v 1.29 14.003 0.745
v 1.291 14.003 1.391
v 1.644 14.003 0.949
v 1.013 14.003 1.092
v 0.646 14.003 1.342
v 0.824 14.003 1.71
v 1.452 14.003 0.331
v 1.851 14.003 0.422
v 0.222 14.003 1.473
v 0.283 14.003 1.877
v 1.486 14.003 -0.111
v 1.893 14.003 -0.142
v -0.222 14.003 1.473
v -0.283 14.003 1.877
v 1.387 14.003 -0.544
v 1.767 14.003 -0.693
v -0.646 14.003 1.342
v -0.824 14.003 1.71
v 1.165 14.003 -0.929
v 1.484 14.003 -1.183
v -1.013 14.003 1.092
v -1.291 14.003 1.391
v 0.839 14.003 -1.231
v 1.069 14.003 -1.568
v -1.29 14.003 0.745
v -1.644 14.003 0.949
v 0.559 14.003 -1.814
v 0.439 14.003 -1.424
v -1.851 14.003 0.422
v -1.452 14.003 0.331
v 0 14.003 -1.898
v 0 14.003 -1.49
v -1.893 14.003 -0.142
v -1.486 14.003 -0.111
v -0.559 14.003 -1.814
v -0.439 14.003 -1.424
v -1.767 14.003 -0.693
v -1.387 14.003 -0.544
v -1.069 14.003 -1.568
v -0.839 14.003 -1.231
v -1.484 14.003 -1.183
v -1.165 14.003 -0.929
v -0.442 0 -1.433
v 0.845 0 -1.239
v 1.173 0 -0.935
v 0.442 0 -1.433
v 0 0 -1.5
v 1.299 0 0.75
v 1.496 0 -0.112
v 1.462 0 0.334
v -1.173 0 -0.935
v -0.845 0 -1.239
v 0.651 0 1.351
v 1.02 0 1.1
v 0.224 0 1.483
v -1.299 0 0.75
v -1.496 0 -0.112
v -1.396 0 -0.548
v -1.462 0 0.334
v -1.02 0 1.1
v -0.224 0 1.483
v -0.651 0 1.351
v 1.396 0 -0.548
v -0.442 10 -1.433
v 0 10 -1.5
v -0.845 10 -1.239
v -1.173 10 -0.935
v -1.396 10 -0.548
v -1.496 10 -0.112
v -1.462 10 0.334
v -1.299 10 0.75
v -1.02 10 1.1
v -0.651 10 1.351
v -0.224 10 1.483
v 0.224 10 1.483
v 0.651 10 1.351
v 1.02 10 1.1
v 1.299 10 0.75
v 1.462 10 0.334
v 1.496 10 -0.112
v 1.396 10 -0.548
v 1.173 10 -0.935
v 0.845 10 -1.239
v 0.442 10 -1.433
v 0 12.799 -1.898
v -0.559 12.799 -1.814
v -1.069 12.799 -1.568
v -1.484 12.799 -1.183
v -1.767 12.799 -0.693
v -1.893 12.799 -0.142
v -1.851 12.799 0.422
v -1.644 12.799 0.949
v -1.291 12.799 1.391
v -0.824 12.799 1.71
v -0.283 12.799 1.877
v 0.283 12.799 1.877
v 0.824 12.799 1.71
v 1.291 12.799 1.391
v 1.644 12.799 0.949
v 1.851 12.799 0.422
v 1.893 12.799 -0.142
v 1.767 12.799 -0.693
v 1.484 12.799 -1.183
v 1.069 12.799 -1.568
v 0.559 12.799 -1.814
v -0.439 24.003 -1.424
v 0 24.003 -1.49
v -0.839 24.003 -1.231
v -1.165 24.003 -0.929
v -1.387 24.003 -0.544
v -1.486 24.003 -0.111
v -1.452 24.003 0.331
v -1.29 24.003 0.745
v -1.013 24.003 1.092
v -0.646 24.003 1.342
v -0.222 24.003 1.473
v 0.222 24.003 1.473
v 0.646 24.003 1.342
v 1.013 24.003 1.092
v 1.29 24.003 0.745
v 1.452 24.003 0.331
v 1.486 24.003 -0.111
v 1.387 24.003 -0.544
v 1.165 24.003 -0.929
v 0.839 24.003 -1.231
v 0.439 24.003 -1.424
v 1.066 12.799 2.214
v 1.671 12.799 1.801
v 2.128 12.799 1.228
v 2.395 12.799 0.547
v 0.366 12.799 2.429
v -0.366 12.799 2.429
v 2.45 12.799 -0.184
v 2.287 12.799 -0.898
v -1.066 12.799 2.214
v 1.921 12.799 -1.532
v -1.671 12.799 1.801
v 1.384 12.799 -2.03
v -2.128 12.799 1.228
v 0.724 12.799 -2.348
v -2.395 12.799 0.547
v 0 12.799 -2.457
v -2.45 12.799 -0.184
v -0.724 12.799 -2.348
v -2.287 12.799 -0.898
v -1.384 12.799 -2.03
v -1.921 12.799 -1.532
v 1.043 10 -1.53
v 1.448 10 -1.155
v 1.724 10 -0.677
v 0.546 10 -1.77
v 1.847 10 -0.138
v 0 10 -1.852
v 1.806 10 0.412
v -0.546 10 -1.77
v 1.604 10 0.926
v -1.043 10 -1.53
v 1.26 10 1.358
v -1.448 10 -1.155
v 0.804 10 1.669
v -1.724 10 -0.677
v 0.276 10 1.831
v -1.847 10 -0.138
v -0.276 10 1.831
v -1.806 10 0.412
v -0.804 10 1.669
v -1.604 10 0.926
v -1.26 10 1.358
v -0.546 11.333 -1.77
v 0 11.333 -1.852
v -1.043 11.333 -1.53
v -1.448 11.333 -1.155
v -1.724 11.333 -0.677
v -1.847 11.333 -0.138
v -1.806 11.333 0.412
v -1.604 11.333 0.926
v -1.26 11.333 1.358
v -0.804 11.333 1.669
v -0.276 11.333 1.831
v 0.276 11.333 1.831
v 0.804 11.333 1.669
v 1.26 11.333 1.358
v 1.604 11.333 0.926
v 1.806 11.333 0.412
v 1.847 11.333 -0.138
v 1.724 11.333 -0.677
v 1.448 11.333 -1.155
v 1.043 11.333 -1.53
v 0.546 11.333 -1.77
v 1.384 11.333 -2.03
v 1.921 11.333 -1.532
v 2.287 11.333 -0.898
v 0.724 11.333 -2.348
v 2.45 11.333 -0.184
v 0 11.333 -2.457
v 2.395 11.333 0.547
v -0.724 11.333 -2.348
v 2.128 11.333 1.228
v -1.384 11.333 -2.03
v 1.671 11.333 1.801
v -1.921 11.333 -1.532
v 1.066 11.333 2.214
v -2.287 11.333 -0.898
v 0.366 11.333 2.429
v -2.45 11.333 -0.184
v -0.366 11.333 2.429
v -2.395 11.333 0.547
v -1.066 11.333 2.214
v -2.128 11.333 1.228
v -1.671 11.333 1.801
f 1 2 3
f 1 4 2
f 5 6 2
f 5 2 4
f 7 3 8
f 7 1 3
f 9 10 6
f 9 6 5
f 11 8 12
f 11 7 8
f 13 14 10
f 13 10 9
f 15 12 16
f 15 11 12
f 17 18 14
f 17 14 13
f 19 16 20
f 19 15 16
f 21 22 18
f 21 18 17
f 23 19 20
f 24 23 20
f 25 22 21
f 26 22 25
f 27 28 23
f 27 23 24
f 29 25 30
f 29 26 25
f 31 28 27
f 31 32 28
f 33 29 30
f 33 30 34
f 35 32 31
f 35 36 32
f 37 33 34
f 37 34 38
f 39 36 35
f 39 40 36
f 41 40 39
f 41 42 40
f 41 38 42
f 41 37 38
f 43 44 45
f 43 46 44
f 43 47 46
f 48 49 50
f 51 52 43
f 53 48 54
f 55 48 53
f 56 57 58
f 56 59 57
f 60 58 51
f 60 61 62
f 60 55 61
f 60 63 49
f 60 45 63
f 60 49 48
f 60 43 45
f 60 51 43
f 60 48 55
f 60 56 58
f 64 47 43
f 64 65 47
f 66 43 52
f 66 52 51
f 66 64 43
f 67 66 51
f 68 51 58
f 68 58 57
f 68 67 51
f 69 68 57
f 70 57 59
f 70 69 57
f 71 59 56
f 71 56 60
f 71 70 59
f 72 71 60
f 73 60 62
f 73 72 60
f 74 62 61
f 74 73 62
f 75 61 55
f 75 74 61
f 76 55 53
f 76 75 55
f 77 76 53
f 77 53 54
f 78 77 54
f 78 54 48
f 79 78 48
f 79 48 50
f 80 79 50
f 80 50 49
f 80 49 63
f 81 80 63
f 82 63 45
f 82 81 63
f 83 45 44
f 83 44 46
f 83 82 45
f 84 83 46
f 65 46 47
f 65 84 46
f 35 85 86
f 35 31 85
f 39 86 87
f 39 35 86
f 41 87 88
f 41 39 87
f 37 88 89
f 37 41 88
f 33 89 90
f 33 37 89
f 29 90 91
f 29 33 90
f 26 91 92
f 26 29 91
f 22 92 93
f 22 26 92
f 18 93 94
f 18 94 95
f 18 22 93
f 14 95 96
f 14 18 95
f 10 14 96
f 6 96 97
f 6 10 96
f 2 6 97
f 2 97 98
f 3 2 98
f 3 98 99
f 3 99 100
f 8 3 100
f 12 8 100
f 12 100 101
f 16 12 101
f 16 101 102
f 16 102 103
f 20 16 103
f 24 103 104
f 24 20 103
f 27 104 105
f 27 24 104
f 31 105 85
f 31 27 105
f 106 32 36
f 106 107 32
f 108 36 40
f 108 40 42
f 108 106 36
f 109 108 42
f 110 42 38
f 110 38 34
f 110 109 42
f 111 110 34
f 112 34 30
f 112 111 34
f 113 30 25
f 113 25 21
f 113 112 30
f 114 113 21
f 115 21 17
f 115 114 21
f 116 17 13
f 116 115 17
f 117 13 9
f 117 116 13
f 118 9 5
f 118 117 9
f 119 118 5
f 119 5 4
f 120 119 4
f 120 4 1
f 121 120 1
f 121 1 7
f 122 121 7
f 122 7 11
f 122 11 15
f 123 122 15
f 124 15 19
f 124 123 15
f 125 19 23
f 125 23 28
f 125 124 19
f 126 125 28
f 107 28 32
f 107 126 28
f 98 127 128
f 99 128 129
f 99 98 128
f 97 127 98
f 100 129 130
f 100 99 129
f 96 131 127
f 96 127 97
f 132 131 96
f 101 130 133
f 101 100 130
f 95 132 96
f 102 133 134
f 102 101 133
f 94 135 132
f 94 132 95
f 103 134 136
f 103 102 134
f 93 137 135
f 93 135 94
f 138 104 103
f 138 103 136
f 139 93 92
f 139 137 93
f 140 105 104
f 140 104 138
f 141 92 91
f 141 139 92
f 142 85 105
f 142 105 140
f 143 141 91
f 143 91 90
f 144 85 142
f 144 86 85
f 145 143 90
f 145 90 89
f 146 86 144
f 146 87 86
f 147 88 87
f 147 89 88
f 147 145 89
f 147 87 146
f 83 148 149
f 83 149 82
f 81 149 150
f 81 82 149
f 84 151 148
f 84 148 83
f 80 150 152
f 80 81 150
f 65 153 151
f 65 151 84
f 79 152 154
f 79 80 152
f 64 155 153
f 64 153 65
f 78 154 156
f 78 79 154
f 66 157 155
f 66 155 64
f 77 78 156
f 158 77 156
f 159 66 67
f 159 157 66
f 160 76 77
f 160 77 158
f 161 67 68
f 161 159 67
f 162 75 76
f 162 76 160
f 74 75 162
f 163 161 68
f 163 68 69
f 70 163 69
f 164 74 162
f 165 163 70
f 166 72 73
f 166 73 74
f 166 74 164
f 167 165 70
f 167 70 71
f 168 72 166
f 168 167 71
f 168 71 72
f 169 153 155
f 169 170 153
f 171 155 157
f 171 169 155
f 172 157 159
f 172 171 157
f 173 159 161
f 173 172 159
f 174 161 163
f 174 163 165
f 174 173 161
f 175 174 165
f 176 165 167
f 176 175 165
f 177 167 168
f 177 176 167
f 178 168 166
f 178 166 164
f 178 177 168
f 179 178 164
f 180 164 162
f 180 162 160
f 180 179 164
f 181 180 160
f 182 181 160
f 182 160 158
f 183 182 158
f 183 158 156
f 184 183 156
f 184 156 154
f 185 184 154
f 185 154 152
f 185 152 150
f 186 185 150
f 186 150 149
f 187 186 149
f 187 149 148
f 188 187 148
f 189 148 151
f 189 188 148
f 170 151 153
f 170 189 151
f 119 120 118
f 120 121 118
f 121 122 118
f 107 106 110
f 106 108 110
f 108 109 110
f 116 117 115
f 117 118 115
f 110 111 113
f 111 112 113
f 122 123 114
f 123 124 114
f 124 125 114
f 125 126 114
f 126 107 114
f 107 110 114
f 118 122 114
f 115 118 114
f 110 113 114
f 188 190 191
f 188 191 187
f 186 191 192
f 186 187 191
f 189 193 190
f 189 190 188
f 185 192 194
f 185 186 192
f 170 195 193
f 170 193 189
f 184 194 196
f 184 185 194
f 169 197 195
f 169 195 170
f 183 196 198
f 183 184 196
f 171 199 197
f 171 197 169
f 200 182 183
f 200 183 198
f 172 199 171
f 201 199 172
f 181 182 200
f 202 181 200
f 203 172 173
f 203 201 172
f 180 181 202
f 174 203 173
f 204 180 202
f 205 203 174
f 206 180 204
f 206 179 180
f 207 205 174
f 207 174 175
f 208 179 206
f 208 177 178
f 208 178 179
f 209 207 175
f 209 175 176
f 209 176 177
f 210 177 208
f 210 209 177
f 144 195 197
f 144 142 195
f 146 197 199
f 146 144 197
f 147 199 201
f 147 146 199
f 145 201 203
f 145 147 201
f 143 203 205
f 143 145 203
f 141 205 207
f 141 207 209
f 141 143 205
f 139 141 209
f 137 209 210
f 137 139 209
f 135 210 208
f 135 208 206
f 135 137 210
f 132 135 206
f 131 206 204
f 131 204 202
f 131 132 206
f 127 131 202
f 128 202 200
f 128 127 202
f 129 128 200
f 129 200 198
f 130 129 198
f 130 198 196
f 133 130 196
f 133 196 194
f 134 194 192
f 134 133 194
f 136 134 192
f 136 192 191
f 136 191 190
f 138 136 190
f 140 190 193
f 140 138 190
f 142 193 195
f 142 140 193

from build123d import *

# Parameters (mm, degrees)
SKETCH_2_W   = 1.5
SKETCH_2_H   = 10
SKETCH_2_W_2 = 1.489718874


with BuildPart() as part:
    # 草图2 → 旋转1 (revolve)
    with BuildSketch(Plane(origin=(0, 0, 0), x_dir=(0, 0, -1), z_dir=(1, 0, 0))):
        with Locations((0.75, 5)):
            Rectangle(SKETCH_2_W, SKETCH_2_H)
        Polygon((0, 11.333239566), (0, 10), (1.5, 10), (1.852020266, 10), (1.852020266, 11.333239566), align=None)
        Polygon((0, 12.799080051), (0, 11.333239566), (1.852020266, 11.333239566), (2.456922178, 11.333239566), (2.456922178, 12.799080051), (1.898093602, 12.799080051), align=None)
        Polygon((0, 14.00271083), (0, 12.799080051), (1.898093602, 12.799080051), (1.898093602, 14.00271083), (1.489718874, 14.00271083), align=None)
        with Locations((0.744859437, 19.00271083)):
            Rectangle(SKETCH_2_W_2, SKETCH_2_H)
    revolve(axis=Axis((0, 0, 0), (0, 1, 0)))


solid = part.part
